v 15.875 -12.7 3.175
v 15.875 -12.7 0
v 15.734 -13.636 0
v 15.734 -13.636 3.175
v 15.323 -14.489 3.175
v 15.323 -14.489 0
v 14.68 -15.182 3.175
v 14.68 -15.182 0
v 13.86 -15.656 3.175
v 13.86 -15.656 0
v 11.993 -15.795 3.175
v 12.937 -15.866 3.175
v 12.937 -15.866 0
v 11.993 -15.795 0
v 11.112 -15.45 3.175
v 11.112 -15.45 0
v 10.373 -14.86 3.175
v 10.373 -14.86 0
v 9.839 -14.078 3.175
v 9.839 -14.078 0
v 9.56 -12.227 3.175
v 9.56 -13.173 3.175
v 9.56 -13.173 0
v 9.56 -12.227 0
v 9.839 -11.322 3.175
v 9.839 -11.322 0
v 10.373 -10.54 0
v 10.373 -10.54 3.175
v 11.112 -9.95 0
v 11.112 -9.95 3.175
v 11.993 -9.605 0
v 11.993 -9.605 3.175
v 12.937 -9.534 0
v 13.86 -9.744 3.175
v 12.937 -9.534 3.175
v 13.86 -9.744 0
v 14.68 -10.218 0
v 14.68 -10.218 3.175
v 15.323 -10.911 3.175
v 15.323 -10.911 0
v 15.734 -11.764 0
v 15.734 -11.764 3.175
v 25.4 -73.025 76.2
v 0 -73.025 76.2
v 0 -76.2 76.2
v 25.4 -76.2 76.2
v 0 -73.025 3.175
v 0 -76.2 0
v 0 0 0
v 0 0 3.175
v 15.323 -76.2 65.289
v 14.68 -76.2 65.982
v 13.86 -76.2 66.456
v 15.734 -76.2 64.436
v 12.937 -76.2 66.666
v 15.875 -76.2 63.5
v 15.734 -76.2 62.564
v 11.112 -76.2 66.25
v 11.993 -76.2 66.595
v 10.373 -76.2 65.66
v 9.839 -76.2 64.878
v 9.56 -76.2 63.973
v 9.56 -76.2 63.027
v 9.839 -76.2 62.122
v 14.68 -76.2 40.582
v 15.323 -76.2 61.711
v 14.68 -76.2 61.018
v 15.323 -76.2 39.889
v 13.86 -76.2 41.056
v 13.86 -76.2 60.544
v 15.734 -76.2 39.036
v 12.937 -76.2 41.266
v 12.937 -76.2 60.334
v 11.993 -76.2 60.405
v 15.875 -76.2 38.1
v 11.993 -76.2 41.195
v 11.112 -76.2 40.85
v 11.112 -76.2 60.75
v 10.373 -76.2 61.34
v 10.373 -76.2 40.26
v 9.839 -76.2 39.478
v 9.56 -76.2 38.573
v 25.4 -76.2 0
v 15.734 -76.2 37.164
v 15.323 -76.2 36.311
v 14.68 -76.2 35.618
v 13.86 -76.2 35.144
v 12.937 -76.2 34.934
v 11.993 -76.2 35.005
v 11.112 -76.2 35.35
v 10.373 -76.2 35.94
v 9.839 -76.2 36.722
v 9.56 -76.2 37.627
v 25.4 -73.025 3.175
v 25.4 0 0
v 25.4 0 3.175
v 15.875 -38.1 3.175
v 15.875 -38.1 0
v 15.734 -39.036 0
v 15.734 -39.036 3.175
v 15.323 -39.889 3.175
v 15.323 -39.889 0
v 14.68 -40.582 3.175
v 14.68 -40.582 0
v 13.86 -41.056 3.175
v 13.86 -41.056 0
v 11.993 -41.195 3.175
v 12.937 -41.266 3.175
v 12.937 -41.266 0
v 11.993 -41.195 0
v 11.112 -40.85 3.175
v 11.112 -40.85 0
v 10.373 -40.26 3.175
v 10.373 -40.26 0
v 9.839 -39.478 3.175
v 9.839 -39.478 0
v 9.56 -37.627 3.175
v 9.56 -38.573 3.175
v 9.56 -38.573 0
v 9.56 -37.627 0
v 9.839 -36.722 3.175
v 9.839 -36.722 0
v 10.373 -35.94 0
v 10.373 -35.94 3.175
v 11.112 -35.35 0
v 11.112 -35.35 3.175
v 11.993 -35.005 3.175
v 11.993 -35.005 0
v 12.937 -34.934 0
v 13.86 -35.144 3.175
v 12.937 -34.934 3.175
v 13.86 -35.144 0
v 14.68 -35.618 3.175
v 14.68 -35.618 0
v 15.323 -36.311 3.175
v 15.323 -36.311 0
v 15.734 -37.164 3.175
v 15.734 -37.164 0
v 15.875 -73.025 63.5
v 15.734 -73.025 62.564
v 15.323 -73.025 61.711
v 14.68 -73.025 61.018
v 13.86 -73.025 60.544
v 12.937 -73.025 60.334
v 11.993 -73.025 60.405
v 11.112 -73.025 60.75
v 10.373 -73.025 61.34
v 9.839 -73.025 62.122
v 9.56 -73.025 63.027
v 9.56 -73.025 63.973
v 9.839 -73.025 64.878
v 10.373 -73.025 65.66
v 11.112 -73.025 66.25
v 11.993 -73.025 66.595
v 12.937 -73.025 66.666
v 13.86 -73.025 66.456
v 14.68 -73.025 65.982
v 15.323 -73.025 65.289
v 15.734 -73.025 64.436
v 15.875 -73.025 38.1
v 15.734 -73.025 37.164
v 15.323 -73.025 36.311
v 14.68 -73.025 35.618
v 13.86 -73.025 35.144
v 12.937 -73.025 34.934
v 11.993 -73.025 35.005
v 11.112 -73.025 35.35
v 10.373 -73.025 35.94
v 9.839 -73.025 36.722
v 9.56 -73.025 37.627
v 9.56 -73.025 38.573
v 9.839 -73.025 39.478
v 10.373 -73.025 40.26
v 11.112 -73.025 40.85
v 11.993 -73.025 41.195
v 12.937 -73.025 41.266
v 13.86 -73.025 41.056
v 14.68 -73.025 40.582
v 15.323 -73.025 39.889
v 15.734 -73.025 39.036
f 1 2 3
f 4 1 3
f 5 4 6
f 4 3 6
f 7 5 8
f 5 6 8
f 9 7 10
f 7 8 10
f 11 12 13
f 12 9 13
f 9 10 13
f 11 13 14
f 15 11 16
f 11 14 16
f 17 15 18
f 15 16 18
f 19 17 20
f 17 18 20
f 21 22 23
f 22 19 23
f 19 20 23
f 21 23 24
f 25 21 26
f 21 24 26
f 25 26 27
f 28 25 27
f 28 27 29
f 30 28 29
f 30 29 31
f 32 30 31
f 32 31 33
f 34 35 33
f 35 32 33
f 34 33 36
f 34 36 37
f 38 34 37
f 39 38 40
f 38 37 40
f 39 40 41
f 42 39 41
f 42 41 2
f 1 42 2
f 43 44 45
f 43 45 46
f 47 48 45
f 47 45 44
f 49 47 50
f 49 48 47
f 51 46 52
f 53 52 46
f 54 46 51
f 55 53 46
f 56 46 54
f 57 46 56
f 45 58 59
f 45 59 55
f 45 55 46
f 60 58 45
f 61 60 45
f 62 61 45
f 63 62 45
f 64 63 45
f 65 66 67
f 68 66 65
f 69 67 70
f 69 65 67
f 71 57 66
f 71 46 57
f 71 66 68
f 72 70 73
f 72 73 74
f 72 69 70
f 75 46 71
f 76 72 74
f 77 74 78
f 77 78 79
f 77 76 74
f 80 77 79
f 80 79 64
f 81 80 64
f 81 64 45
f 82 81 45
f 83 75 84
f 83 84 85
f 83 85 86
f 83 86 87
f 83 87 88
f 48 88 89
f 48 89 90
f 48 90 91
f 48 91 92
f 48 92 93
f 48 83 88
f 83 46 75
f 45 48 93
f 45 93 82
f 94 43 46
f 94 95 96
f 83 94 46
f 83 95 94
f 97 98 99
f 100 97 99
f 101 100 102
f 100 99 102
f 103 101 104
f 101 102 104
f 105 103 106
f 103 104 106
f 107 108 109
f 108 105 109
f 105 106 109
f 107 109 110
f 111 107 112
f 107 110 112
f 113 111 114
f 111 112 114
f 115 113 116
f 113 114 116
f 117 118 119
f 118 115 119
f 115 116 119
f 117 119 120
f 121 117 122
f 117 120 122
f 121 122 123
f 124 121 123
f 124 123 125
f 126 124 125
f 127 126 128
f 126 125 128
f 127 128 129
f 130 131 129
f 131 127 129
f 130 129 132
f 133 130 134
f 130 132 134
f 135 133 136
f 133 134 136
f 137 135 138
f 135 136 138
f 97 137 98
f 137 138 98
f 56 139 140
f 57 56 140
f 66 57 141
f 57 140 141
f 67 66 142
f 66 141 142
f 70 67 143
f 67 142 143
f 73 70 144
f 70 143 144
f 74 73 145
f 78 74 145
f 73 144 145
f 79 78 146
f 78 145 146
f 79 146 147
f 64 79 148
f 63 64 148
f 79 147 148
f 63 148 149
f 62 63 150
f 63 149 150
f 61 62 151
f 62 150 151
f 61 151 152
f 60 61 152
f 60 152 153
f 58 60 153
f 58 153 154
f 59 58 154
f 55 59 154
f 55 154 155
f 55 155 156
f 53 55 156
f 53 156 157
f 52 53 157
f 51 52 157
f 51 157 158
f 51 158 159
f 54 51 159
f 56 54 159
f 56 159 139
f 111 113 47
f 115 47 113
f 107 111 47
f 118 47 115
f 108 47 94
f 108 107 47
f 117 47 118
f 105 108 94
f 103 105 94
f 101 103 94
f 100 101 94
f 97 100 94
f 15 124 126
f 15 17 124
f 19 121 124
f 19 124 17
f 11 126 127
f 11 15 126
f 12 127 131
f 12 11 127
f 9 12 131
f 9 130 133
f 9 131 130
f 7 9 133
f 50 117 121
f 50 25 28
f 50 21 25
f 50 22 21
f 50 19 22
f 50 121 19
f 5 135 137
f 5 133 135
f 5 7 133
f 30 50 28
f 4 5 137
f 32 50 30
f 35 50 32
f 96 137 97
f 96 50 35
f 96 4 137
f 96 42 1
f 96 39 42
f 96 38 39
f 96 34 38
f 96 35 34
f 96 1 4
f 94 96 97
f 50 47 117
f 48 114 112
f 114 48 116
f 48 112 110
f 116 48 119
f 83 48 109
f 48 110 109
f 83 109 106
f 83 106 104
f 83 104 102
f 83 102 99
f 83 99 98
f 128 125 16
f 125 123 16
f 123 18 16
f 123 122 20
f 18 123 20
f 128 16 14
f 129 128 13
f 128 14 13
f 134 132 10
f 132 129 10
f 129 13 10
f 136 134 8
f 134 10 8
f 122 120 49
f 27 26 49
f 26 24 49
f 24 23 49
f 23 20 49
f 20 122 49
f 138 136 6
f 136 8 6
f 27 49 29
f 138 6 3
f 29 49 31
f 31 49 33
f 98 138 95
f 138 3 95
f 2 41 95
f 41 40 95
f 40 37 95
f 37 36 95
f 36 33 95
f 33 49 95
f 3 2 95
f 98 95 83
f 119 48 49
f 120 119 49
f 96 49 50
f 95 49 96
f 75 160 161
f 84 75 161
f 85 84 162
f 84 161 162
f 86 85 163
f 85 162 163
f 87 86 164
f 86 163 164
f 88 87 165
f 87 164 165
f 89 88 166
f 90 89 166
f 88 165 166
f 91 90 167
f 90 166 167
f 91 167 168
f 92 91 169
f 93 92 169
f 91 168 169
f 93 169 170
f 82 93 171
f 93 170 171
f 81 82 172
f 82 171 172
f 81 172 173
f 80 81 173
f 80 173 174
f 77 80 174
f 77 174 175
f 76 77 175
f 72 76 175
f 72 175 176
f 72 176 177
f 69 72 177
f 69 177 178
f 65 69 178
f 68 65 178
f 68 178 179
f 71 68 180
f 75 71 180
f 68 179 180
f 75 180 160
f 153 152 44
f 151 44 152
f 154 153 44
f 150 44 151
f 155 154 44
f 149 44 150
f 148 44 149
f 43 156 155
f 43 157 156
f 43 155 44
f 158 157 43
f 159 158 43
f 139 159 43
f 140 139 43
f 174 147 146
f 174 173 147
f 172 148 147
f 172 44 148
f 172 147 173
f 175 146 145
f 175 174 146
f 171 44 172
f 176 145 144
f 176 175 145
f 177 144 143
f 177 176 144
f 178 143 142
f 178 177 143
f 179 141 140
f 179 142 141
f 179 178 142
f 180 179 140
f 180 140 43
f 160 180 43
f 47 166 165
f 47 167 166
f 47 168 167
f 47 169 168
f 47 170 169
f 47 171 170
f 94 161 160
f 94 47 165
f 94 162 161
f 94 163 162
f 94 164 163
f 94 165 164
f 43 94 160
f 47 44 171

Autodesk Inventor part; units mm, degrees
ref_plane "YZ Plane" through (0, 0, 0) normal (1, 0, 0) x (0, 1, 0)
ref_plane "XZ Plane" through (0, 0, 0) normal (0, 1, 0) x (-1, 0, 0)
ref_plane "XY Plane" through (0, 0, 0) normal (0, 0, 1) x (1, 0, 0)
sketch "Sketch1" plane through (0, 0, 0) normal (0, 0, 1) x (1, 0, 0)
  line L0 (0, 0) -> (25.4, 0)
  line L1 (25.4, 0) -> (25.4, -76.2)
  line L2 (25.4, -76.2) -> (0, -76.2)
  line L3 (0, -76.2) -> (0, 0)
  circle A0 centre (12.7, -12.7) radius 3.175
  circle A1 centre (12.7, -38.1) radius 3.175
  dimension "d0" = 25.4
  dimension "d1" = 76.2
  dimension "d2" = 6.35
  dimension "d3" = 6.35
  dimension "d4" = 12.7
  dimension "d5" = 12.7
  dimension "d6" = 12.7
  dimension "d7" = 25.4
extrude "Extrusion1" add sketch "Sketch1" along normal blind 3.175
sketch "Sketch2" plane through (0, 0, 3.175) normal (0, 0, 1) x (1, 0, 0)
  line L0 (25.4, -76.2) -> (25.4, 0) projected
  line L1 (0, 0) -> (0, -76.2) projected
  line L2 (25.4, -76.2) -> (0, -76.2)
  line L3 (0, -76.2) -> (0, -73.025)
  line L4 (0, -73.025) -> (25.4, -73.025)
  line L5 (25.4, -73.025) -> (25.4, -76.2)
  dimension "d10" = 3.175
extrude "Extrusion2" add sketch "Sketch2" along normal blind 73.025
sketch "Sketch3" plane through (0, -73.025, 3.175) normal (0, 1, 0) x (1, 0, 0)
  circle A0 centre (12.7, -60.325) radius 3.175
  circle A1 centre (12.7, -34.925) radius 3.175
  line L0 (0, 0) -> (0, -73.025) projected
  line L1 (25.4, -73.025) -> (0, -73.025) projected
  point P0 (0, 3.175)
  dimension "d13" = 6.35
  dimension "d14" = 6.35
  dimension "d15" = 12.7
  dimension "d16" = 12.7
  dimension "d17" = 12.7
  dimension "d18" = 25.4
extrude "Extrusion3" cut sketch "Sketch3" against normal blind 73.025
properties part number "15102898-16-P-0510" material "Stainless Steel"
